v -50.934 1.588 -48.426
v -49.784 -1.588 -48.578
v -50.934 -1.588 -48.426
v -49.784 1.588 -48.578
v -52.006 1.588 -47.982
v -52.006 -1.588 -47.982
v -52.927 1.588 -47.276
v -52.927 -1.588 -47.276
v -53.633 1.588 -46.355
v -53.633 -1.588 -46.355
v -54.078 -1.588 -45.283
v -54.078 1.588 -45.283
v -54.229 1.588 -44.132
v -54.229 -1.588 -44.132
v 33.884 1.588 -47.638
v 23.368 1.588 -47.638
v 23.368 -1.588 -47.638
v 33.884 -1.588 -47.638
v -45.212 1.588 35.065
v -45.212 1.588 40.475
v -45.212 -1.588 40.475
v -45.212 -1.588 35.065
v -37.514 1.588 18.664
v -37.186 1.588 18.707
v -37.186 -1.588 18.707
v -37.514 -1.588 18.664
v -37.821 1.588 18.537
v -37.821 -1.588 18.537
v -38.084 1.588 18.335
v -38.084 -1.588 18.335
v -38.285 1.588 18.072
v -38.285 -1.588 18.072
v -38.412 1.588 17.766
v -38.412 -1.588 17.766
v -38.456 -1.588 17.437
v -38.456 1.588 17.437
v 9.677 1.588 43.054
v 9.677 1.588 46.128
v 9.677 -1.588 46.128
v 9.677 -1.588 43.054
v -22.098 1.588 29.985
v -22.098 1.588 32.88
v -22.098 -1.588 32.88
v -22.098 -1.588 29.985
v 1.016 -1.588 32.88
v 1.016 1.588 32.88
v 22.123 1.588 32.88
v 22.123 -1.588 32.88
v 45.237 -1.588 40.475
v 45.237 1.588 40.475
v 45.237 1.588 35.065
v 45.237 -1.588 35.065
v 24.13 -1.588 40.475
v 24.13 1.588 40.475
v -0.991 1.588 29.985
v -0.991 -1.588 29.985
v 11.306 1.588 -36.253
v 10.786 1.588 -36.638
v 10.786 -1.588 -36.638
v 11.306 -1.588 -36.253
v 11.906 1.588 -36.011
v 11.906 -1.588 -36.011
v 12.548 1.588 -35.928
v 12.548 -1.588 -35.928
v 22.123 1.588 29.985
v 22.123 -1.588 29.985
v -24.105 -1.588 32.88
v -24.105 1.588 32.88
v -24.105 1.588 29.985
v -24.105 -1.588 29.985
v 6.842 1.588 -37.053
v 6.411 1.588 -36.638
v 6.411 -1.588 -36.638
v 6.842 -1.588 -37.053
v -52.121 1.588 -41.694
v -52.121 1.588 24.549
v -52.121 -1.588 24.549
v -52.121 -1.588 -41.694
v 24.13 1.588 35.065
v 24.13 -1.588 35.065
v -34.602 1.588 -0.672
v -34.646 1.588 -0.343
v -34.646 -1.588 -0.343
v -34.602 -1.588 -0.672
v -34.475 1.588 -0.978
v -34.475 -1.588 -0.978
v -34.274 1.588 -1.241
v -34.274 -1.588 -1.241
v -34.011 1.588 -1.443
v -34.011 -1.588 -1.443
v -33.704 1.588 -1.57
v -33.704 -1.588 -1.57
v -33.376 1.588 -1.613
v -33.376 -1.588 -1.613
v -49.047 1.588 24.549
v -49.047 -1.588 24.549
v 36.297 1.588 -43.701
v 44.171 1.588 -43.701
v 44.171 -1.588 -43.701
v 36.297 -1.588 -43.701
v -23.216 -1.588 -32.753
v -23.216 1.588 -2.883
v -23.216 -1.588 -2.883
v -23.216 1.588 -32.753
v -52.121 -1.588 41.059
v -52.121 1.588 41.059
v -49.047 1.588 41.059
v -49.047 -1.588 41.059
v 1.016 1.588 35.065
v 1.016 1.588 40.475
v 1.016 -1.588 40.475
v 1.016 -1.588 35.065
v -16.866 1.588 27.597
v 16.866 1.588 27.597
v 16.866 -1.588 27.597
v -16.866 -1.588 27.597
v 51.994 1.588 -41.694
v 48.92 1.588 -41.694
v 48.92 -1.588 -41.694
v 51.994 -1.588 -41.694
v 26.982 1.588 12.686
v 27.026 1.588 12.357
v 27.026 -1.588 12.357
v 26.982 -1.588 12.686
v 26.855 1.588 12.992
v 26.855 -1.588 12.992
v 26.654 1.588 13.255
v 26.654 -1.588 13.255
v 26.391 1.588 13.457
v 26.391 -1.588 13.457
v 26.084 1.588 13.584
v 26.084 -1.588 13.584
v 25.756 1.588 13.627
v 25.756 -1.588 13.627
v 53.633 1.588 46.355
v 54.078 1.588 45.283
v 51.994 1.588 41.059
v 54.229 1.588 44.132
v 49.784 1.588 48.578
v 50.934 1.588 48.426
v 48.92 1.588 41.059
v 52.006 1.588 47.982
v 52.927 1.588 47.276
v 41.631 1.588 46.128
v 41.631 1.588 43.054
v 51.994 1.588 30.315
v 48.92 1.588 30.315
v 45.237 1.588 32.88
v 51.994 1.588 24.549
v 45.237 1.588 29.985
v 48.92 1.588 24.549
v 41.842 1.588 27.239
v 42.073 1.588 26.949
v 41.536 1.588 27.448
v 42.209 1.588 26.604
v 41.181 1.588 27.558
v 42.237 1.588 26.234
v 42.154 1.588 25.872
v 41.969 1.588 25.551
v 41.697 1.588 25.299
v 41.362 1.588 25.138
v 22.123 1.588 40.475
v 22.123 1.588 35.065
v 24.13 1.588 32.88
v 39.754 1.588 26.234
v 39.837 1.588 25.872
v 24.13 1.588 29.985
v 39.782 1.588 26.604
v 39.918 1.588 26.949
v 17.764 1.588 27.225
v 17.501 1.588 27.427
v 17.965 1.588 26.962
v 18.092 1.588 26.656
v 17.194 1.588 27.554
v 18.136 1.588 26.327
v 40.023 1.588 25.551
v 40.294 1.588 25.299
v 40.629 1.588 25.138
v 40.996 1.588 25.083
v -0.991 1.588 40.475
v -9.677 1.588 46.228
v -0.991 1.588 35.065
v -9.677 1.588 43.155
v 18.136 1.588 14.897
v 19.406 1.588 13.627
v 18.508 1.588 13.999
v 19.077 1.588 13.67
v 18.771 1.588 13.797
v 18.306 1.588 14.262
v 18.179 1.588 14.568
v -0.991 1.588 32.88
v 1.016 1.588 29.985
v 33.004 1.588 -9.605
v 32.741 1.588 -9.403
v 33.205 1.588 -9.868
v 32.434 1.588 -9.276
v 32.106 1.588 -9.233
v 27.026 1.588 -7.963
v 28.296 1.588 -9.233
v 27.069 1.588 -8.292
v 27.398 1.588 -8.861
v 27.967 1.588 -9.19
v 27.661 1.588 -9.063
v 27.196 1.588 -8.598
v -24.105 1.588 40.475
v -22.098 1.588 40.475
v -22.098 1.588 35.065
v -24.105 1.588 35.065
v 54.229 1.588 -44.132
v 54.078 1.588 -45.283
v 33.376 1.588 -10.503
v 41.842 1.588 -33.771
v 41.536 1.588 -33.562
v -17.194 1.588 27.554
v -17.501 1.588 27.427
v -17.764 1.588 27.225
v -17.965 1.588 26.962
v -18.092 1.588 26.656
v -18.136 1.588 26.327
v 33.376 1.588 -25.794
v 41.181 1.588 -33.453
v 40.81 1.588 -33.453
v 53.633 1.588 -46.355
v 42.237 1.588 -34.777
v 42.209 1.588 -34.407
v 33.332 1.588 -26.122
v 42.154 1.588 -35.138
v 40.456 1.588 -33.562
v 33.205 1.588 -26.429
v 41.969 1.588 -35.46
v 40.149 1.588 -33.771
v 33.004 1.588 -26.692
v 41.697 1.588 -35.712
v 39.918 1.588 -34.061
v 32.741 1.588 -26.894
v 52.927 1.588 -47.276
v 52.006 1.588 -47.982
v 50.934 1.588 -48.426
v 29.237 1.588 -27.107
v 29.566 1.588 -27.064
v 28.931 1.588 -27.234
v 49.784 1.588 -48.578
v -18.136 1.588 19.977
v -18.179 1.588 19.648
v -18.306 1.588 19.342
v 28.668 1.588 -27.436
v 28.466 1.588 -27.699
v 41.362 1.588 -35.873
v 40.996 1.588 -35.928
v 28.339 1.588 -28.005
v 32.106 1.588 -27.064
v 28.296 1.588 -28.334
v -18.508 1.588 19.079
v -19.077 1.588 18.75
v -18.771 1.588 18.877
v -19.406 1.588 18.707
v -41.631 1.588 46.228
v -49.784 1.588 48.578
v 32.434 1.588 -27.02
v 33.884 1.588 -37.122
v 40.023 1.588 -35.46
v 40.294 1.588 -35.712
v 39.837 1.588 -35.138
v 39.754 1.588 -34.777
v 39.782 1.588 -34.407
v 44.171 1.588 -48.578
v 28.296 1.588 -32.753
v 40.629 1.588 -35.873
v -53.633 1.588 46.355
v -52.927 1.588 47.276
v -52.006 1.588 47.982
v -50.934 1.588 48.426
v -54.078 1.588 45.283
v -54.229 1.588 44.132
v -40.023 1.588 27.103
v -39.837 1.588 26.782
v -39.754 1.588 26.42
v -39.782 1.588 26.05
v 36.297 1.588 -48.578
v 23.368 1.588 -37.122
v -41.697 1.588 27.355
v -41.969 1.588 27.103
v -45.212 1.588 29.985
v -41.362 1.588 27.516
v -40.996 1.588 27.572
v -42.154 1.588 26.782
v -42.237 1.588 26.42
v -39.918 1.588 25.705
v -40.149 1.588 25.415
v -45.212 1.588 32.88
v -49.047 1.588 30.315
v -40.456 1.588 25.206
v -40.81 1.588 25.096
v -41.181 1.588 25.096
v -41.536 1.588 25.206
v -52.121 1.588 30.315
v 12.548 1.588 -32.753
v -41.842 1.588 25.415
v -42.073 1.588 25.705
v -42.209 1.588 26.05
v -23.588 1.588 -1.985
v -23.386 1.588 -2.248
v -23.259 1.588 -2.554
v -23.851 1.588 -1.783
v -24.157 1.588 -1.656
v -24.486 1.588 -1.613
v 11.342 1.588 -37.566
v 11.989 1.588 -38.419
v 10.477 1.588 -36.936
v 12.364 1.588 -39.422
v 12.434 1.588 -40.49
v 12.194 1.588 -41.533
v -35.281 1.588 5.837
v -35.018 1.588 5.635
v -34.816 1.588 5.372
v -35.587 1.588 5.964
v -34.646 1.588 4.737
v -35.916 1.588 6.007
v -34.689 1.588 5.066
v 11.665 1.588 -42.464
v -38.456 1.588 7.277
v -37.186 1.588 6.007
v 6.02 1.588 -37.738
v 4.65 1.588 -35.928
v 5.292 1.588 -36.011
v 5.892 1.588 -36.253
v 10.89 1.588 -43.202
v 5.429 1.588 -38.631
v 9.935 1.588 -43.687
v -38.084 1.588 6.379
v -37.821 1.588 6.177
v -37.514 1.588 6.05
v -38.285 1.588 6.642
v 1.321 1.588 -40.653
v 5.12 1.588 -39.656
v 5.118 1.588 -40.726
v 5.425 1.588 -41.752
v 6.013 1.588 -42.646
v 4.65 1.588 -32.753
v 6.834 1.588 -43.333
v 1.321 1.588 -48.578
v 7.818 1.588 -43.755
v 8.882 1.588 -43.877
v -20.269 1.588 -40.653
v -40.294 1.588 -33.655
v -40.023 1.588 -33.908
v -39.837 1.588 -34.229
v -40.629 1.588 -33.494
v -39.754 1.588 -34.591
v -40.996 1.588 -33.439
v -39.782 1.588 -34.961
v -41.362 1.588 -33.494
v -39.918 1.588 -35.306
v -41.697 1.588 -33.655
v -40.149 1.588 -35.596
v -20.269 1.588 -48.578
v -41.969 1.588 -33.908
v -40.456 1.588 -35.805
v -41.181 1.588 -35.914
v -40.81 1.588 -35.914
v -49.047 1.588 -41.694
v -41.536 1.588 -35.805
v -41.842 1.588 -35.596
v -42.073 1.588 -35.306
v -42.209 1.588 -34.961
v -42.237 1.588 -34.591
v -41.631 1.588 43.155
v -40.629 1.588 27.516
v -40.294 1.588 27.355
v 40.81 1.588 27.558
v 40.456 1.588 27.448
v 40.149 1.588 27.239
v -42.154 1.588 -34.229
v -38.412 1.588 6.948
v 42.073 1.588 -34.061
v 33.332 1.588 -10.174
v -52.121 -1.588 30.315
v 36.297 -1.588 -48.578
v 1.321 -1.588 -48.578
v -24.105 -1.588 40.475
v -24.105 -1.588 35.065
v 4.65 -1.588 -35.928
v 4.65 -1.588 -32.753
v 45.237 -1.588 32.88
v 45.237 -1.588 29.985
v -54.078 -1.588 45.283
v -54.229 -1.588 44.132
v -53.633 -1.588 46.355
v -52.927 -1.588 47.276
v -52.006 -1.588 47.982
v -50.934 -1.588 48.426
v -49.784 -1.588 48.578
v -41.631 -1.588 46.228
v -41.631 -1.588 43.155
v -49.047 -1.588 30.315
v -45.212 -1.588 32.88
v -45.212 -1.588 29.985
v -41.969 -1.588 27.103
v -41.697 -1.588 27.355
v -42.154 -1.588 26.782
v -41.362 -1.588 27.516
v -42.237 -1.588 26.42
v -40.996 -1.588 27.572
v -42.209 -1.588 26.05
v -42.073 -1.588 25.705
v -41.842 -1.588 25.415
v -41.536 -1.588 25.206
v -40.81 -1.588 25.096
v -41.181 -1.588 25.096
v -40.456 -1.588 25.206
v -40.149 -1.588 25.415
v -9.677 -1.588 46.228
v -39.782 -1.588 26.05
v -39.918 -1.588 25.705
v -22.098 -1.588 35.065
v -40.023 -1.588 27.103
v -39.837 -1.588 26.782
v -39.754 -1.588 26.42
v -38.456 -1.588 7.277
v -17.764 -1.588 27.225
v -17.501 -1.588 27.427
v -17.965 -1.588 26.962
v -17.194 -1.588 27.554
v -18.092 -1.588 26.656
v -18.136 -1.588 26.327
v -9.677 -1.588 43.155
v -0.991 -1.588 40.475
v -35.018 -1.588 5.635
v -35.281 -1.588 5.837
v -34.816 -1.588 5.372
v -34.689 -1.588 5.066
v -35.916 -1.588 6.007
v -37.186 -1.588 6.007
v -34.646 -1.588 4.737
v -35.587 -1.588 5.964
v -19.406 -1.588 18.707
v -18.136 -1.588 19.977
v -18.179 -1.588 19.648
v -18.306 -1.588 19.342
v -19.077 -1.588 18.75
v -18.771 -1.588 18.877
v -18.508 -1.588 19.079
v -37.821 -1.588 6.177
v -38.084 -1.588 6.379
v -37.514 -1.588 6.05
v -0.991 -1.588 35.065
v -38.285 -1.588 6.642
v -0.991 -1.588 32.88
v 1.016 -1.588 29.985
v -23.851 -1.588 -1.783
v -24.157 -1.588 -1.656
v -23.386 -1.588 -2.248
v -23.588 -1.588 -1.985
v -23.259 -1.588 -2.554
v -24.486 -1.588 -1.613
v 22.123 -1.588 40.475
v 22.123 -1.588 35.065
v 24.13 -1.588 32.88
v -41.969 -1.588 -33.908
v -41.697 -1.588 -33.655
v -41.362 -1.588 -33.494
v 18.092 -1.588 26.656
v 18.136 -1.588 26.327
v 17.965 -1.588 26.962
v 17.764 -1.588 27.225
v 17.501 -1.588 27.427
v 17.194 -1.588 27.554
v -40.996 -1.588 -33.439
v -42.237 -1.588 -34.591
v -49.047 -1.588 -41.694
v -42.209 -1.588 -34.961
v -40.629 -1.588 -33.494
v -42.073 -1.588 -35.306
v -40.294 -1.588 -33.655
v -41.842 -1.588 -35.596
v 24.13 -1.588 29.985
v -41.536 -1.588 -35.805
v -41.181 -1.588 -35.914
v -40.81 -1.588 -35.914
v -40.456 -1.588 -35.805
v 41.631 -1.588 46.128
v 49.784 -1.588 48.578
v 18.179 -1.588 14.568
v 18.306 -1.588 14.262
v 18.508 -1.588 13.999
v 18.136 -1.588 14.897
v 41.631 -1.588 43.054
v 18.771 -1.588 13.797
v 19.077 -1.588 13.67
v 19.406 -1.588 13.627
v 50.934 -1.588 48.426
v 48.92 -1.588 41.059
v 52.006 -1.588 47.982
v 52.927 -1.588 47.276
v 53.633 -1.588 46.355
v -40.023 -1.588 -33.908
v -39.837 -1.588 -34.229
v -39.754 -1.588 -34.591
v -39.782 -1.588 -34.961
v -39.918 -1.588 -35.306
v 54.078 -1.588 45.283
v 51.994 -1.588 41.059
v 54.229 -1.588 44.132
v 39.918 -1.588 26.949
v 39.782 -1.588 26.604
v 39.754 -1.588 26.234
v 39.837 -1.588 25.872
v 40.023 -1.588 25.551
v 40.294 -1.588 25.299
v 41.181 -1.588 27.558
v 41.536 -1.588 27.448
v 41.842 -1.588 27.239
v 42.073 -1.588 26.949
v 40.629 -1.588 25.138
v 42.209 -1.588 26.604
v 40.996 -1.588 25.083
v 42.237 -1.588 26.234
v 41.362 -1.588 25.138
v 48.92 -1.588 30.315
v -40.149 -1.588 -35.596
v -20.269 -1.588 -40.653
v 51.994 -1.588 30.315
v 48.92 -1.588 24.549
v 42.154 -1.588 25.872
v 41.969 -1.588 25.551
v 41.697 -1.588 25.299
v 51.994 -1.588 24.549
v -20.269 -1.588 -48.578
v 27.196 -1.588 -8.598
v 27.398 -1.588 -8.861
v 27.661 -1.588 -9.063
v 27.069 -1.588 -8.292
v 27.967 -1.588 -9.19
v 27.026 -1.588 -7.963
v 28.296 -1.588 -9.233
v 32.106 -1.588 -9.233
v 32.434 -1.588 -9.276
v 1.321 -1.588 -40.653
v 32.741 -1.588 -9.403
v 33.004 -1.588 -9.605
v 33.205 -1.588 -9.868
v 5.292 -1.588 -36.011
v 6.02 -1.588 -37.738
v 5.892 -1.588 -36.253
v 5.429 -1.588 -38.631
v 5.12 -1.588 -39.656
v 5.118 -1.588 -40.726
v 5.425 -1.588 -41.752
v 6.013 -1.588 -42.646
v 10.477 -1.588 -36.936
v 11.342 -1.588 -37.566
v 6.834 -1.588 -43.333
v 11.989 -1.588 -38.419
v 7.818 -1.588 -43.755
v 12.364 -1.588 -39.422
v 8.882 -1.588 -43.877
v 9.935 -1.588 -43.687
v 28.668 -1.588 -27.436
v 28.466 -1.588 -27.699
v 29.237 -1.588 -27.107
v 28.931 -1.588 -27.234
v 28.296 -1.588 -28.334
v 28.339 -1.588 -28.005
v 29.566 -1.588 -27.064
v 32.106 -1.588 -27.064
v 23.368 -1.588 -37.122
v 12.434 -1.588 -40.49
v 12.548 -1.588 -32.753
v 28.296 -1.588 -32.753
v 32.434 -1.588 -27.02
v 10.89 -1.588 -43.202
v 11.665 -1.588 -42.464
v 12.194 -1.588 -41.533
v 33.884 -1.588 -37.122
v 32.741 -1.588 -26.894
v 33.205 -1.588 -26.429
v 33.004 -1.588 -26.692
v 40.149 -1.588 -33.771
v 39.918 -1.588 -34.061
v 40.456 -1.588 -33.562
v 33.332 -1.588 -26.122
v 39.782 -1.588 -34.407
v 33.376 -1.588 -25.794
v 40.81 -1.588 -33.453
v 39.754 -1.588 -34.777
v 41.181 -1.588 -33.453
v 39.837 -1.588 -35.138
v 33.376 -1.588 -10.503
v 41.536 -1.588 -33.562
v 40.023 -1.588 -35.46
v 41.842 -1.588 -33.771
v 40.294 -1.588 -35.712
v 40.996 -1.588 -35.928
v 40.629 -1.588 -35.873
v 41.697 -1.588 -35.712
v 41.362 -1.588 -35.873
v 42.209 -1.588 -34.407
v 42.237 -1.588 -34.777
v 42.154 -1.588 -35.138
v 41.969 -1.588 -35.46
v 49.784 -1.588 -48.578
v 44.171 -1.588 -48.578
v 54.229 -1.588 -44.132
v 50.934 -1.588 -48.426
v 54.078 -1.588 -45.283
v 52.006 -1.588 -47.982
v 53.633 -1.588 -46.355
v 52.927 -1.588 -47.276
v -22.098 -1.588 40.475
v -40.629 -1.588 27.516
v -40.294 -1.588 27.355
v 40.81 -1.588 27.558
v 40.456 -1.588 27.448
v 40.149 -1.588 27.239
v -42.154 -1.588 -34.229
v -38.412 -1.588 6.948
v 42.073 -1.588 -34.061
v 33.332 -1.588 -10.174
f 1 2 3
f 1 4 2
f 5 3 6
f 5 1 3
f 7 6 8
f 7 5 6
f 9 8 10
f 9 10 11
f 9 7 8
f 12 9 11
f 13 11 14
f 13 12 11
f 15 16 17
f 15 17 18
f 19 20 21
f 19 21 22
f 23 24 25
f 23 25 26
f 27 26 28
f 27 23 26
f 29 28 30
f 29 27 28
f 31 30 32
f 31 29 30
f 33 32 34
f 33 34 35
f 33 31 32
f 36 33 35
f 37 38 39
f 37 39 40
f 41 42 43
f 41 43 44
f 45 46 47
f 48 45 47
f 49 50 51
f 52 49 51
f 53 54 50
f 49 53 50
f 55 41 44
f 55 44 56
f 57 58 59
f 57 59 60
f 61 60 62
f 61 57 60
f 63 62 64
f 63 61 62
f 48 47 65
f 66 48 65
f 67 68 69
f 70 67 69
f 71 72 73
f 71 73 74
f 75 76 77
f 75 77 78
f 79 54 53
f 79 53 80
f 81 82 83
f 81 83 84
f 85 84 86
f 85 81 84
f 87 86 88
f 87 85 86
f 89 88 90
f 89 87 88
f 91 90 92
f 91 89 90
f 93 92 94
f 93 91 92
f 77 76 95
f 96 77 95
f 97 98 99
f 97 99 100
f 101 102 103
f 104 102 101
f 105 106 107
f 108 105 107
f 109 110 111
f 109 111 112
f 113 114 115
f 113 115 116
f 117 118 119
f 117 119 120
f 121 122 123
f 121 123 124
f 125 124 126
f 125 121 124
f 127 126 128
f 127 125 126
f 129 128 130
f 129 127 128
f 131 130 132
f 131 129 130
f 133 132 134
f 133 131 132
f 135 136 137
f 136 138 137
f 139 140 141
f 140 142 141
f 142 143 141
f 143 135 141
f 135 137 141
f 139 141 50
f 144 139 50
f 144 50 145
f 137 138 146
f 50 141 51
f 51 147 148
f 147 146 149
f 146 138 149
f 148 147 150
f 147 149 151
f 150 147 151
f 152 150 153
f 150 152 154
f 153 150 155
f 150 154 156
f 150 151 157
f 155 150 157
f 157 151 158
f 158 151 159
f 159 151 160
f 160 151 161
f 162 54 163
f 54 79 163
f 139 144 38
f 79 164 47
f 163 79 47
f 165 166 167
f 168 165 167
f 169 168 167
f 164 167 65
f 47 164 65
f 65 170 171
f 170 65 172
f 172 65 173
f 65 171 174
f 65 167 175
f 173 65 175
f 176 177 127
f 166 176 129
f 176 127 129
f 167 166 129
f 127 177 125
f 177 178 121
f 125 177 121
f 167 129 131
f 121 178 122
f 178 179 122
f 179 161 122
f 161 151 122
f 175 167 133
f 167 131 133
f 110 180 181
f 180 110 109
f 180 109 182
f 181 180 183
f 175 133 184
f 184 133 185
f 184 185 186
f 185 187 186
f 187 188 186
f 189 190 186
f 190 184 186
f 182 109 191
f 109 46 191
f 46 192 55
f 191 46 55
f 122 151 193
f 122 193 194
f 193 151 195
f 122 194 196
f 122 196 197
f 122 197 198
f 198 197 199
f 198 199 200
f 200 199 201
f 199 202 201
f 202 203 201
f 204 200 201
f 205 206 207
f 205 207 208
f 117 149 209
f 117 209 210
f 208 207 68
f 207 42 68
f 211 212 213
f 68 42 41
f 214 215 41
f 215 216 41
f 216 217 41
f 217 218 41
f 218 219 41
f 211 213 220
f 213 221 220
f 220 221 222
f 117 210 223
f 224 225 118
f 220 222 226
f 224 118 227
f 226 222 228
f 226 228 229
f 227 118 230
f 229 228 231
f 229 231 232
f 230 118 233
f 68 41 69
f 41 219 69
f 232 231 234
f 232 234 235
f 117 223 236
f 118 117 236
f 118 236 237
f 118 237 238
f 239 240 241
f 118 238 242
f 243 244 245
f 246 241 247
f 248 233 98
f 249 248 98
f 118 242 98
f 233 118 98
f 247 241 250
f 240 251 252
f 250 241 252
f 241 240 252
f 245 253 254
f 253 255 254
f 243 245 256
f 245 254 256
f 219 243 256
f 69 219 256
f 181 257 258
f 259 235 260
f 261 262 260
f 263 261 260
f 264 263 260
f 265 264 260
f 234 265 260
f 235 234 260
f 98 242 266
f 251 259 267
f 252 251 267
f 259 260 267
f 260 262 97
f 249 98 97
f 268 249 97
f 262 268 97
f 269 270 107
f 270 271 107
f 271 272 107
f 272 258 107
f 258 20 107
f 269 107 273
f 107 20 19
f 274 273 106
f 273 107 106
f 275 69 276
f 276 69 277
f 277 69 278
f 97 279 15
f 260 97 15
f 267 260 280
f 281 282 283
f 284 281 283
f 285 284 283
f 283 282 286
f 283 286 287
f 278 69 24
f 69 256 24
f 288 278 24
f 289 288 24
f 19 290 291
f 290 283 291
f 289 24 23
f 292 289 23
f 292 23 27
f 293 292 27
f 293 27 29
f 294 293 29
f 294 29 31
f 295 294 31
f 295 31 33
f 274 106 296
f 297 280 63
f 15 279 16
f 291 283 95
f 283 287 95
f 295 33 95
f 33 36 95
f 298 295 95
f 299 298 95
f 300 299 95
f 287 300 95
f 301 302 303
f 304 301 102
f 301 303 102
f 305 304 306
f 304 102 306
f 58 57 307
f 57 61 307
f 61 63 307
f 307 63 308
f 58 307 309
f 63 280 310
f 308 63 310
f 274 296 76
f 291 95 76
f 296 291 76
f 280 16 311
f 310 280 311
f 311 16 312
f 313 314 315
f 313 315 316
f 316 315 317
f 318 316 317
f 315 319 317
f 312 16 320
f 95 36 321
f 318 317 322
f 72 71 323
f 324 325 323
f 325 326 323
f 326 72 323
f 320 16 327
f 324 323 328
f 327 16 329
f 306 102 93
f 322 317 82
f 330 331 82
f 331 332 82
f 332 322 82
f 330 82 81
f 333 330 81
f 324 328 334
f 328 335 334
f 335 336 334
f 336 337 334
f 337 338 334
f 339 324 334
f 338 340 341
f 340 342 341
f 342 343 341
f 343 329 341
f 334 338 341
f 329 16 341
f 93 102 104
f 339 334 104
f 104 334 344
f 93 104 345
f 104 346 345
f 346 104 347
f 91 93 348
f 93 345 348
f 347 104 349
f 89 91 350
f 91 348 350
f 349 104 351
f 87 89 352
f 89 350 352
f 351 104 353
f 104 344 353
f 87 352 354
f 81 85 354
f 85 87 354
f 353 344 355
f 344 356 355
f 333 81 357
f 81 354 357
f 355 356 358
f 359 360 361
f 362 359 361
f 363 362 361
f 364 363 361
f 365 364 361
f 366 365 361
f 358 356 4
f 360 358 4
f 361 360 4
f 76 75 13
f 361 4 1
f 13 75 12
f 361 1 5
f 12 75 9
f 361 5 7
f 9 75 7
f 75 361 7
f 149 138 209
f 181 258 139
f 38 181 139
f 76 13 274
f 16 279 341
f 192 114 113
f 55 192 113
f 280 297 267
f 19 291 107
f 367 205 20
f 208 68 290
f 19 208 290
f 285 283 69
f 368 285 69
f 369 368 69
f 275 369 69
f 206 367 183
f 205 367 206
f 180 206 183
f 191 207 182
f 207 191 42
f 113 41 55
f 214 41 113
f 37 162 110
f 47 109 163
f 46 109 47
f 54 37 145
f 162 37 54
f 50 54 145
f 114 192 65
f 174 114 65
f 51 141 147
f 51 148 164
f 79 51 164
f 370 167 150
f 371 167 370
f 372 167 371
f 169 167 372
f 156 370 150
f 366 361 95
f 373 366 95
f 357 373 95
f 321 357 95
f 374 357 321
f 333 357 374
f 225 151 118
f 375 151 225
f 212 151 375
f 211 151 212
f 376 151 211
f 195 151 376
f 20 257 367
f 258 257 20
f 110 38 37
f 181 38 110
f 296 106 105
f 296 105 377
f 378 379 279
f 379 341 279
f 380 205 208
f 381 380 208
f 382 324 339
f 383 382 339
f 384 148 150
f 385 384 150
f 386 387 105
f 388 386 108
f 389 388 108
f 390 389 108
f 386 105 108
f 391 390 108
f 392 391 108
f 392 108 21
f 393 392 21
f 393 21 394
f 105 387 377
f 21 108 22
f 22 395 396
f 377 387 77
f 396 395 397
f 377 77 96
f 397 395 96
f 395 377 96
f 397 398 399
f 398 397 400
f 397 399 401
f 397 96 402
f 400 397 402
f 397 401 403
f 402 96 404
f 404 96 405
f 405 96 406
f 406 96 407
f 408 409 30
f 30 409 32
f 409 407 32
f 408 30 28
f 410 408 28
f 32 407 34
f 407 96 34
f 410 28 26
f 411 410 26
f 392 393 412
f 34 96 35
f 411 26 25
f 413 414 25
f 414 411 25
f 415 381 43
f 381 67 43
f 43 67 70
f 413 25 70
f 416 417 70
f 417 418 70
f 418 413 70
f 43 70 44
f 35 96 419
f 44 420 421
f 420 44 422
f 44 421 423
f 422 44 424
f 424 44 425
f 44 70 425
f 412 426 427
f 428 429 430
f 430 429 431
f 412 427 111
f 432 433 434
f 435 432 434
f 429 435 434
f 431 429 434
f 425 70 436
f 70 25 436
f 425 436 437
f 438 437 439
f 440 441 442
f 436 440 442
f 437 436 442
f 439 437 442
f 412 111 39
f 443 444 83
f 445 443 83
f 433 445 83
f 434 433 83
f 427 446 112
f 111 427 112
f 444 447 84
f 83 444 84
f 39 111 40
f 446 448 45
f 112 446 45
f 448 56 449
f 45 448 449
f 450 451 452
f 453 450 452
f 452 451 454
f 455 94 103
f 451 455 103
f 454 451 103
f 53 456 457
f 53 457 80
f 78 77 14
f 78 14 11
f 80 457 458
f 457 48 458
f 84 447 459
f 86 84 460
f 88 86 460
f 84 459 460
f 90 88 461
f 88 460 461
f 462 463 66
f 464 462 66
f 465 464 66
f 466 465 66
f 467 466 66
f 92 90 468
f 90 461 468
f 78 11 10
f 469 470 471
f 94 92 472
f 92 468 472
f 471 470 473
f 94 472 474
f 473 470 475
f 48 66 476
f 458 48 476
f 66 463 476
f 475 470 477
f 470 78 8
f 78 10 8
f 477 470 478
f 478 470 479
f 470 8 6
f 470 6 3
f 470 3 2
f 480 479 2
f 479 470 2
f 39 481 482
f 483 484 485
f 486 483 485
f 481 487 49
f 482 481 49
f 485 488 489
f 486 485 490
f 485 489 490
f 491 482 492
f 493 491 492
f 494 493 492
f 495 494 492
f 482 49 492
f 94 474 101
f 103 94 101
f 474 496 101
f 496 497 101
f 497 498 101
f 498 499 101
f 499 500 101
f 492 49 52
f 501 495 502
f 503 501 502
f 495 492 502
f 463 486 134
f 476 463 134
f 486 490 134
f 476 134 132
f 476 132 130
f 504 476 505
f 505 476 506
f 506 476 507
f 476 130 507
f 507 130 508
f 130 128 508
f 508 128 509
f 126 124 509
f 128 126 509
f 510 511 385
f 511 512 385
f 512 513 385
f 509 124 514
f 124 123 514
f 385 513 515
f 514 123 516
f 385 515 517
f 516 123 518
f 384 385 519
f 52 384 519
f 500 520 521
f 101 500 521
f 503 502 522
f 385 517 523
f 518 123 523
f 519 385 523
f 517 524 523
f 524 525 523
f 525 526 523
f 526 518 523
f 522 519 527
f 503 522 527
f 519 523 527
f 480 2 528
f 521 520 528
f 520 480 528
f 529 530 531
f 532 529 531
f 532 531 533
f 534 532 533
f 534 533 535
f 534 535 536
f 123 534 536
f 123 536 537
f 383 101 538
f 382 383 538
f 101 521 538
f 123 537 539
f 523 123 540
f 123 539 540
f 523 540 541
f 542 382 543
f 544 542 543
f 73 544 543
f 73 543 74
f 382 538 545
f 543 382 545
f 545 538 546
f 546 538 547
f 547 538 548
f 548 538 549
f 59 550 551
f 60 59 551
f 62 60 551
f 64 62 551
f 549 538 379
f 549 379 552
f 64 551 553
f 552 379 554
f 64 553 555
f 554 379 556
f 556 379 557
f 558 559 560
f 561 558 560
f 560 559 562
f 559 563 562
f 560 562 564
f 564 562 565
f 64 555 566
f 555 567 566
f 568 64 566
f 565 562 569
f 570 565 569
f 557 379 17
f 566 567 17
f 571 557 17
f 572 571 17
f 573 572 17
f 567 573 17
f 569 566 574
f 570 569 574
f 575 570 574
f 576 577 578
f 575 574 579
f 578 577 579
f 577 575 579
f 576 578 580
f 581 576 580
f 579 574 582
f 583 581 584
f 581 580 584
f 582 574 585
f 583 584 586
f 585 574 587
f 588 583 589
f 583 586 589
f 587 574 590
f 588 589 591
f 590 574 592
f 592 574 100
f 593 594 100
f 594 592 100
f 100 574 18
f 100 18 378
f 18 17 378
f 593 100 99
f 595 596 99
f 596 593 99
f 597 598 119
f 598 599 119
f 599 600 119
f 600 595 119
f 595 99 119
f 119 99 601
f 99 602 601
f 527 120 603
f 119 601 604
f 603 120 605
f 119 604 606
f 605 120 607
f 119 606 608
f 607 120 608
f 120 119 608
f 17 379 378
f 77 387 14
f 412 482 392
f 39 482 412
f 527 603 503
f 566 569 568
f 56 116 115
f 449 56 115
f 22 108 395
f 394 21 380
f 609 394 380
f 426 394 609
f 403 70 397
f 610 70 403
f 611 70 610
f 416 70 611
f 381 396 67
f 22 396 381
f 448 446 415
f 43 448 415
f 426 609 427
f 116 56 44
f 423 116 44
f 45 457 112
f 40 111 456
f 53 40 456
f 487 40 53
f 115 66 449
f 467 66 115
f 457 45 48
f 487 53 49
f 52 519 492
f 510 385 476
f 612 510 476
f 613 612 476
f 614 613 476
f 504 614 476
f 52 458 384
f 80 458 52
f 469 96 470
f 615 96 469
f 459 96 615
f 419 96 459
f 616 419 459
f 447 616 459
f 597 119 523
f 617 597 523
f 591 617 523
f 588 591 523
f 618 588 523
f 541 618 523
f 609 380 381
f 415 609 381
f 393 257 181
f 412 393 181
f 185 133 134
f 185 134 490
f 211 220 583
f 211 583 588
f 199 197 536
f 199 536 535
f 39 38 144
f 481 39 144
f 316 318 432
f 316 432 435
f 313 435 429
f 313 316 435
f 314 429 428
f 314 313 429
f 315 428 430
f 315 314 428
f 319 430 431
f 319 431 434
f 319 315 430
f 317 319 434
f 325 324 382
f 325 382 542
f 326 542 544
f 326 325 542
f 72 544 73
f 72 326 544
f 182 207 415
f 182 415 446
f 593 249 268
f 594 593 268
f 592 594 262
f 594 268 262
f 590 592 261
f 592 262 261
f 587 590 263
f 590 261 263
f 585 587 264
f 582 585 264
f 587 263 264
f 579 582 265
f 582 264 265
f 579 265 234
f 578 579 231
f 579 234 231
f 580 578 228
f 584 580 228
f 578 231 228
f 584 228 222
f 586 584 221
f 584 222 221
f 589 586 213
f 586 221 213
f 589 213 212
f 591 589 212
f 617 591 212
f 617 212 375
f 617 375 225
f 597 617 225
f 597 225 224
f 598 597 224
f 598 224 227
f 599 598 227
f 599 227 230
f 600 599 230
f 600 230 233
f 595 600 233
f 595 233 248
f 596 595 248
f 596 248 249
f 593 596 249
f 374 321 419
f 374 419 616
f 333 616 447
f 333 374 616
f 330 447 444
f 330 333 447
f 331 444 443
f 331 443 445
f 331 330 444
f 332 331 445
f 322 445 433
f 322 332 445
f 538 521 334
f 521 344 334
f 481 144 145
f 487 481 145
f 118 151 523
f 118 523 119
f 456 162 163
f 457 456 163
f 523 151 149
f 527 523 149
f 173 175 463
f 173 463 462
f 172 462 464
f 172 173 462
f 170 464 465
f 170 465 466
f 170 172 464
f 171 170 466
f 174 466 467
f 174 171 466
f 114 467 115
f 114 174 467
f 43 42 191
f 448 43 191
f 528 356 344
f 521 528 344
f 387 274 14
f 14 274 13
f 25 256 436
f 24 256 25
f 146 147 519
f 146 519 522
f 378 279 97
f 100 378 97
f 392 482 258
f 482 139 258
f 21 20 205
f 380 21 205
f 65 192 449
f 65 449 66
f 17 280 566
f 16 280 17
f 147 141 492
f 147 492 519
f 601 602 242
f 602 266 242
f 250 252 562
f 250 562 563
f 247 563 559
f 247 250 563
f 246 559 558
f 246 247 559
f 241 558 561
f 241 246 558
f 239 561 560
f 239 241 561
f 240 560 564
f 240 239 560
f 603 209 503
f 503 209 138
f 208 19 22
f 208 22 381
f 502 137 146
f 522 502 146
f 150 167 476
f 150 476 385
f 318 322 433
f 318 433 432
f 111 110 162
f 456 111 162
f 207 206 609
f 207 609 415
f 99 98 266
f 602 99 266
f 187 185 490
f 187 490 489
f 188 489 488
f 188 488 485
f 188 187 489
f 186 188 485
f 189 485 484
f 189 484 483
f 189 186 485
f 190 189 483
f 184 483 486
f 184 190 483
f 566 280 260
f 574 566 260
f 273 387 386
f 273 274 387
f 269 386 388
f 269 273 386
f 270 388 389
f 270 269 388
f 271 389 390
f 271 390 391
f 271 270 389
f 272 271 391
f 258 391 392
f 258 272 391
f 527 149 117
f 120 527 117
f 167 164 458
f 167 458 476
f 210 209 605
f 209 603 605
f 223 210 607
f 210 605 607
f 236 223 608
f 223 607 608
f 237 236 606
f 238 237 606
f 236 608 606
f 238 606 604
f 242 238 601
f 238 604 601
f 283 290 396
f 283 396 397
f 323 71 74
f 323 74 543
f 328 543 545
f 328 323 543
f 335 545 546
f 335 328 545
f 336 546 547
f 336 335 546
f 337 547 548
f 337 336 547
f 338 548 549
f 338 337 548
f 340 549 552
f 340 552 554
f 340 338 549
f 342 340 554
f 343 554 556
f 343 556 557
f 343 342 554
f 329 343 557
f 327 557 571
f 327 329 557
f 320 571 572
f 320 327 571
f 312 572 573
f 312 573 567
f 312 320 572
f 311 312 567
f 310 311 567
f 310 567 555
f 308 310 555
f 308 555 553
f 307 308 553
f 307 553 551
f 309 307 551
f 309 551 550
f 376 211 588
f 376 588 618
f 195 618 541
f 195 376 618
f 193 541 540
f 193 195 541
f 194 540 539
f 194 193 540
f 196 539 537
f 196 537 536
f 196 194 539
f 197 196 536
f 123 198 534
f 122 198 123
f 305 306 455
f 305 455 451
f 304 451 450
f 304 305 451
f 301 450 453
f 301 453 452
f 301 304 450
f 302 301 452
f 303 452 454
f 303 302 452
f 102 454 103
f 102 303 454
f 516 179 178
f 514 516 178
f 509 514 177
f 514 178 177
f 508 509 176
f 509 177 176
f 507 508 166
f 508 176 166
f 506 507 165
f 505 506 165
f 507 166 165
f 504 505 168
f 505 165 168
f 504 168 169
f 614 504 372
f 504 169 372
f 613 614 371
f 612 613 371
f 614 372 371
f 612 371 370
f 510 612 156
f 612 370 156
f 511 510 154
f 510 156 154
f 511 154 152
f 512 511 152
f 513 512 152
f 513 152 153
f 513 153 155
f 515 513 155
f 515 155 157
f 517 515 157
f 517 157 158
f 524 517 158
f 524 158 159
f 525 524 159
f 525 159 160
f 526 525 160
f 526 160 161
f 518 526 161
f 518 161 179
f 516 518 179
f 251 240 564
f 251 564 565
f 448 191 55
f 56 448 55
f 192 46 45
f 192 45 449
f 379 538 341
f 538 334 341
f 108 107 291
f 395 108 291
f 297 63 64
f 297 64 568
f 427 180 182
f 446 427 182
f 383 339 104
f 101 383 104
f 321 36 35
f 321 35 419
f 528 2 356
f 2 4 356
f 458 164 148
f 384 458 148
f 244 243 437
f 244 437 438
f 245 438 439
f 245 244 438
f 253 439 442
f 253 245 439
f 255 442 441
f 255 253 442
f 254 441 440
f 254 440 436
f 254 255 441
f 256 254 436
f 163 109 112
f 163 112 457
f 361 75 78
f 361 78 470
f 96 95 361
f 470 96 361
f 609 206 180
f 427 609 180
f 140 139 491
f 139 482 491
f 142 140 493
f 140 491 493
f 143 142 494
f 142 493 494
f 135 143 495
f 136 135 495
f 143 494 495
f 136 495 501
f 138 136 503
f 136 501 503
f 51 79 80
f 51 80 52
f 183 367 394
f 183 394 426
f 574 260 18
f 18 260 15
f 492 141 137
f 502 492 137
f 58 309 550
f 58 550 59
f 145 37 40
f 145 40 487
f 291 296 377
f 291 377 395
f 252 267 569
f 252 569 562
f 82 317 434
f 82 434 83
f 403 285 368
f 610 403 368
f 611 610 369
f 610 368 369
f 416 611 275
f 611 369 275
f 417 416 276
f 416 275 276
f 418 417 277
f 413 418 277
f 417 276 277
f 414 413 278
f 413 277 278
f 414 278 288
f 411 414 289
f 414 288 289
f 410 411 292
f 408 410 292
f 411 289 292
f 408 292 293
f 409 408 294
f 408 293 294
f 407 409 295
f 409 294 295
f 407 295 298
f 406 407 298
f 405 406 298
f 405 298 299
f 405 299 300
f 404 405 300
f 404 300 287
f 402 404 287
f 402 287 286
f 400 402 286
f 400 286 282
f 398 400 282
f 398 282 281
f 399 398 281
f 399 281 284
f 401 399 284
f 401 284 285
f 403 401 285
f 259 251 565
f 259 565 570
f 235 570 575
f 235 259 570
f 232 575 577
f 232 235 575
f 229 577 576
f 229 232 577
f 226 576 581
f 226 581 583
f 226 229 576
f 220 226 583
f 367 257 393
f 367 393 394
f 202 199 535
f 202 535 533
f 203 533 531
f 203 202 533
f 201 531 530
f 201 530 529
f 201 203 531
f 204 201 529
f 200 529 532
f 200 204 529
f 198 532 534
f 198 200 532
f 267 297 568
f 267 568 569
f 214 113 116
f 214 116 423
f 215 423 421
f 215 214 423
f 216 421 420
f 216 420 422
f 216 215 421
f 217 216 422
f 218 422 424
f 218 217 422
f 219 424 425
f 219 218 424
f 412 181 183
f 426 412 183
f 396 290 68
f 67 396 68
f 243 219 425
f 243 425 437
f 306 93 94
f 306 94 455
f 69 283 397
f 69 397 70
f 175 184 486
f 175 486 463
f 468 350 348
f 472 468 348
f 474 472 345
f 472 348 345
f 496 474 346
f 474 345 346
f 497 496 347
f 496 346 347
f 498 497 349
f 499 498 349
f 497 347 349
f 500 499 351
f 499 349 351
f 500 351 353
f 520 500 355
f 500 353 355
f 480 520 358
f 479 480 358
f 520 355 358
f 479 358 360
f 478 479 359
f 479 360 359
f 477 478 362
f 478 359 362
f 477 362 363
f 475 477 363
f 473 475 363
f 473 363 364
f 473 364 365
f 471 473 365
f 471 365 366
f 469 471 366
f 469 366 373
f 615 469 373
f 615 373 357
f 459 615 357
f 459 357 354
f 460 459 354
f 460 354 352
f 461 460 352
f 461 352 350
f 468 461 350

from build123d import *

# Parameters (mm, degrees)
BOSS_EXTRUDE1_DEPTH = 1.5875
SKETCH2_R           = 1.2446
CUT_EXTRUDE1_DEPTH  = 73.874128278
CUT_EXTRUDE2_DEPTH  = 3.175
SKETCH4_W           = 10.5156
SKETCH4_H           = 10.5156
SKETCH4_W_2         = 3.0734
SKETCH4_H_2         = 66.2432
SKETCH4_H_3         = 10.7442
CUT_EXTRUDE3_DEPTH  = 3.175
SKETCH5_W           = 21.1074
SKETCH5_H           = 2.8956
SKETCH5_H_2         = 5.4102
CUT_EXTRUDE4_DEPTH  = 3.175
SKETCH7_W           = 31.9532
SKETCH7_H           = 3.0734
CUT_EXTRUDE5_DEPTH  = 3.175
FILLET1_R           = 4.445
BOSS_EXTRUDE2_DEPTH = 3.175
BOSS_EXTRUDE3_DEPTH = 3.175


with BuildPart() as part:
    # Sketch1 → Boss-Extrude1 (new, symmetric)
    with BuildSketch(Plane(origin=(0, 0, 0), x_dir=(1, 0, 0), z_dir=(0, 1, 0))):
        Polygon((-20.2692, 48.5775), (-20.2692, 40.6527), (1.3208, 40.6527), (1.3208, 48.5775), (36.2966, 48.5775), (36.2966, 43.0657), (37.1348, 43.0657), (37.1348, 38.7223), (47.1424, 38.7223), (47.1424, 42.701382431), (44.1706, 42.701382431), (44.1706, 48.5775), (54.229, 48.5775), (54.229, -48.5775), (-54.229, -48.5775), (-54.229, 48.5775), align=None)
    extrude(amount=BOSS_EXTRUDE1_DEPTH, both=True)

    # Sketch2 → Cut-Extrude1 (cut, through all)
    with BuildSketch(Plane(origin=(0, 1.5875, 0), x_dir=(1, 0, 0), z_dir=(0, 1, 0))):
        with Locations(Location((-40.9956, 34.6837, 0), (0, 0, 270))):
            Circle(SKETCH2_R)
        with Locations(Location((-40.9956, -26.3271, 0), (0, 0, 270))):
            Circle(SKETCH2_R)
        with Locations(Location((40.9956, -26.3271, 0), (0, 0, 90))):
            Circle(SKETCH2_R)
        with Locations(Location((40.9956, 34.6837, 0), (0, 0, 90))):
            Circle(SKETCH2_R)
    extrude(amount=-CUT_EXTRUDE1_DEPTH, mode=Mode.SUBTRACT)

    # Sketch3 → Cut-Extrude2 (cut)
    with BuildSketch(Plane(origin=(0, 1.5875, 0), x_dir=(1, 0, 0), z_dir=(0, 1, 0))):
        with BuildLine():
            Line((-21.9456, 35.9283), (4.650175487, 35.9283))
            ThreePointArc((4.650175487, 35.9283), (5.599614823, 36.112421194), (6.41140699, 36.63809138))
            Line((6.41140699, 36.63809138), (6.842452629, 37.052891721))
            ThreePointArc((6.842452629, 37.052891721), (8.881692758, 43.876586936), (10.477108356, 36.935696088))
            Line((10.477108356, 36.935696088), (10.786368497, 36.63809138))
            ThreePointArc((10.786368497, 36.63809138), (11.598160664, 36.112421194), (12.5476, 35.9283))
            Line((12.5476, 35.9283), (27.0256, 35.9283))
            ThreePointArc((27.0256, 35.9283), (27.923625612, 35.556325612), (28.2956, 34.6583))
            Line((28.2956, 34.6583), (28.2956, 28.3337))
            ThreePointArc((28.2956, 28.3337), (28.667574388, 27.435674388), (29.5656, 27.0637))
            Line((29.5656, 27.0637), (32.1056, 27.0637))
            ThreePointArc((32.1056, 27.0637), (33.003625612, 26.691725612), (33.3756, 25.7937))
            Line((33.3756, 25.7937), (33.3756, 10.5029))
            ThreePointArc((33.3756, 10.5029), (33.003625612, 9.604874388), (32.1056, 9.2329))
            Line((32.1056, 9.2329), (28.2956, 9.2329))
            ThreePointArc((28.2956, 9.2329), (27.397574388, 8.860925612), (27.0256, 7.9629))
            Line((27.0256, 7.9629), (27.0256, -12.3571))
            ThreePointArc((27.0256, -12.3571), (26.653625612, -13.255125612), (25.7556, -13.6271))
            Line((25.7556, -13.6271), (19.4056, -13.6271))
            ThreePointArc((19.4056, -13.6271), (18.507574388, -13.999074388), (18.1356, -14.8971))
            Line((18.1356, -14.8971), (18.1356, -26.3271))
            ThreePointArc((18.1356, -26.3271), (17.763625612, -27.225125612), (16.8656, -27.5971))
            Line((16.8656, -27.5971), (-16.8656, -27.5971))
            ThreePointArc((-16.8656, -27.5971), (-17.763625612, -27.225125612), (-18.1356, -26.3271))
            Line((-18.1356, -26.3271), (-18.1356, -19.9771))
            ThreePointArc((-18.1356, -19.9771), (-18.507574388, -19.079074388), (-19.4056, -18.7071))
            Line((-19.4056, -18.7071), (-37.1856, -18.7071))
            ThreePointArc((-37.1856, -18.7071), (-38.083625612, -18.335125612), (-38.4556, -17.4371))
            Line((-38.4556, -17.4371), (-38.4556, -7.2771))
            ThreePointArc((-38.4556, -7.2771), (-38.083625612, -6.379074388), (-37.1856, -6.0071))
            Line((-37.1856, -6.0071), (-35.9156, -6.0071))
            ThreePointArc((-35.9156, -6.0071), (-35.017574388, -5.635125612), (-34.6456, -4.7371))
            Line((-34.6456, -4.7371), (-34.6456, 0.3429))
            ThreePointArc((-34.6456, 0.3429), (-34.273625612, 1.240925612), (-33.3756, 1.6129))
            Line((-33.3756, 1.6129), (-24.4856, 1.6129))
            ThreePointArc((-24.4856, 1.6129), (-23.587574388, 1.984874388), (-23.2156, 2.8829))
            Line((-23.2156, 2.8829), (-23.2156, 34.6583))
            ThreePointArc((-23.2156, 34.6583), (-22.843625612, 35.556325612), (-21.9456, 35.9283))
        make_face()
    extrude(amount=-CUT_EXTRUDE2_DEPTH, mode=Mode.SUBTRACT)

    # Sketch4 → Cut-Extrude3 (cut)
    with BuildSketch(Plane(origin=(0, 1.5875, 0), x_dir=(1, 0, 0), z_dir=(0, 1, 0))):
        with Locations((28.6258, 42.3799)):
            Rectangle(SKETCH4_W, SKETCH4_H)
        with Locations((-50.5841, 8.5725)):
            Rectangle(SKETCH4_W_2, SKETCH4_H_2)
        with Locations((-50.5841, -35.687)):
            Rectangle(SKETCH4_W_2, SKETCH4_H_3)
        with Locations((50.4571, 8.5725)):
            Rectangle(SKETCH4_W_2, SKETCH4_H_2)
        with Locations((50.4571, -35.687)):
            Rectangle(SKETCH4_W_2, SKETCH4_H_3)
    extrude(amount=-CUT_EXTRUDE3_DEPTH, mode=Mode.SUBTRACT)

    # Sketch5 → Cut-Extrude4 (cut)
    with BuildSketch(Plane(origin=(0, 1.5875, 0), x_dir=(1, 0, 0), z_dir=(0, 1, 0))):
        with Locations((-34.6583, -31.4325)):
            Rectangle(SKETCH5_W, SKETCH5_H)
        with Locations((-34.6583, -37.7698)):
            Rectangle(SKETCH5_W, SKETCH5_H_2)
        with Locations((-11.5443, -37.7698)):
            Rectangle(SKETCH5_W, SKETCH5_H_2)
        with Locations((-11.5443, -31.4325)):
            Rectangle(SKETCH5_W, SKETCH5_H)
        with Locations((11.5697, -31.4325)):
            Rectangle(SKETCH5_W, SKETCH5_H)
        with Locations((11.5697, -37.7698)):
            Rectangle(SKETCH5_W, SKETCH5_H_2)
        with Locations((34.6837, -37.7698)):
            Rectangle(SKETCH5_W, SKETCH5_H_2)
        with Locations((34.6837, -31.4325)):
            Rectangle(SKETCH5_W, SKETCH5_H)
    extrude(amount=-CUT_EXTRUDE4_DEPTH, mode=Mode.SUBTRACT)

    # Sketch7 → Cut-Extrude5 (cut)
    with BuildSketch(Plane(origin=(0, 1.5875, 0), x_dir=(1, 0, 0), z_dir=(0, 1, 0))):
        with Locations((-25.654, -44.691406541)):
            Rectangle(SKETCH7_W, SKETCH7_H)
        with Locations((25.654, -44.590951919)):
            Rectangle(SKETCH7_W, SKETCH7_H)
    extrude(amount=-CUT_EXTRUDE5_DEPTH, mode=Mode.SUBTRACT)

    # Fillet1
    fillet1_edges = [part.edges().sort_by_distance(p)[0] for p in [
        (-54.229, 0, -48.5775),
        (54.229, 0, -48.5775),
        (54.229, 0, 48.5775),
        (-54.229, 0, 48.5775),
    ]]
    fillet(fillet1_edges, radius=FILLET1_R)

    # Sketch8 → Boss-Extrude2 (add)
    with BuildSketch(Plane(origin=(0, 1.5875, 0), x_dir=(1, 0, 0), z_dir=(0, 1, 0))):
        Polygon((37.1348, 43.0657), (37.1348, 38.7223), (47.1424, 38.7223), (47.1424, 43.0657), (47.1424, 43.7007), (36.2966, 43.7007), (36.2966, 43.0657), align=None)
    extrude(amount=-BOSS_EXTRUDE2_DEPTH)

    # Sketch9 → Boss-Extrude3 (add)
    with BuildSketch(Plane(origin=(0, 1.5875, 0), x_dir=(1, 0, 0), z_dir=(0, 1, 0))):
        Polygon((-23.2156, 34.6583), (-23.2156, 35.9283), (4.650175487, 35.9283), (4.650175487, 32.7533), (-23.2156, 32.7533), align=None)
        Polygon((28.2956, 34.6583), (28.2956, 35.9283), (12.5476, 35.9283), (12.5476, 32.7533), (28.2956, 32.7533), align=None)
    extrude(amount=-BOSS_EXTRUDE3_DEPTH)


solid = part.part
